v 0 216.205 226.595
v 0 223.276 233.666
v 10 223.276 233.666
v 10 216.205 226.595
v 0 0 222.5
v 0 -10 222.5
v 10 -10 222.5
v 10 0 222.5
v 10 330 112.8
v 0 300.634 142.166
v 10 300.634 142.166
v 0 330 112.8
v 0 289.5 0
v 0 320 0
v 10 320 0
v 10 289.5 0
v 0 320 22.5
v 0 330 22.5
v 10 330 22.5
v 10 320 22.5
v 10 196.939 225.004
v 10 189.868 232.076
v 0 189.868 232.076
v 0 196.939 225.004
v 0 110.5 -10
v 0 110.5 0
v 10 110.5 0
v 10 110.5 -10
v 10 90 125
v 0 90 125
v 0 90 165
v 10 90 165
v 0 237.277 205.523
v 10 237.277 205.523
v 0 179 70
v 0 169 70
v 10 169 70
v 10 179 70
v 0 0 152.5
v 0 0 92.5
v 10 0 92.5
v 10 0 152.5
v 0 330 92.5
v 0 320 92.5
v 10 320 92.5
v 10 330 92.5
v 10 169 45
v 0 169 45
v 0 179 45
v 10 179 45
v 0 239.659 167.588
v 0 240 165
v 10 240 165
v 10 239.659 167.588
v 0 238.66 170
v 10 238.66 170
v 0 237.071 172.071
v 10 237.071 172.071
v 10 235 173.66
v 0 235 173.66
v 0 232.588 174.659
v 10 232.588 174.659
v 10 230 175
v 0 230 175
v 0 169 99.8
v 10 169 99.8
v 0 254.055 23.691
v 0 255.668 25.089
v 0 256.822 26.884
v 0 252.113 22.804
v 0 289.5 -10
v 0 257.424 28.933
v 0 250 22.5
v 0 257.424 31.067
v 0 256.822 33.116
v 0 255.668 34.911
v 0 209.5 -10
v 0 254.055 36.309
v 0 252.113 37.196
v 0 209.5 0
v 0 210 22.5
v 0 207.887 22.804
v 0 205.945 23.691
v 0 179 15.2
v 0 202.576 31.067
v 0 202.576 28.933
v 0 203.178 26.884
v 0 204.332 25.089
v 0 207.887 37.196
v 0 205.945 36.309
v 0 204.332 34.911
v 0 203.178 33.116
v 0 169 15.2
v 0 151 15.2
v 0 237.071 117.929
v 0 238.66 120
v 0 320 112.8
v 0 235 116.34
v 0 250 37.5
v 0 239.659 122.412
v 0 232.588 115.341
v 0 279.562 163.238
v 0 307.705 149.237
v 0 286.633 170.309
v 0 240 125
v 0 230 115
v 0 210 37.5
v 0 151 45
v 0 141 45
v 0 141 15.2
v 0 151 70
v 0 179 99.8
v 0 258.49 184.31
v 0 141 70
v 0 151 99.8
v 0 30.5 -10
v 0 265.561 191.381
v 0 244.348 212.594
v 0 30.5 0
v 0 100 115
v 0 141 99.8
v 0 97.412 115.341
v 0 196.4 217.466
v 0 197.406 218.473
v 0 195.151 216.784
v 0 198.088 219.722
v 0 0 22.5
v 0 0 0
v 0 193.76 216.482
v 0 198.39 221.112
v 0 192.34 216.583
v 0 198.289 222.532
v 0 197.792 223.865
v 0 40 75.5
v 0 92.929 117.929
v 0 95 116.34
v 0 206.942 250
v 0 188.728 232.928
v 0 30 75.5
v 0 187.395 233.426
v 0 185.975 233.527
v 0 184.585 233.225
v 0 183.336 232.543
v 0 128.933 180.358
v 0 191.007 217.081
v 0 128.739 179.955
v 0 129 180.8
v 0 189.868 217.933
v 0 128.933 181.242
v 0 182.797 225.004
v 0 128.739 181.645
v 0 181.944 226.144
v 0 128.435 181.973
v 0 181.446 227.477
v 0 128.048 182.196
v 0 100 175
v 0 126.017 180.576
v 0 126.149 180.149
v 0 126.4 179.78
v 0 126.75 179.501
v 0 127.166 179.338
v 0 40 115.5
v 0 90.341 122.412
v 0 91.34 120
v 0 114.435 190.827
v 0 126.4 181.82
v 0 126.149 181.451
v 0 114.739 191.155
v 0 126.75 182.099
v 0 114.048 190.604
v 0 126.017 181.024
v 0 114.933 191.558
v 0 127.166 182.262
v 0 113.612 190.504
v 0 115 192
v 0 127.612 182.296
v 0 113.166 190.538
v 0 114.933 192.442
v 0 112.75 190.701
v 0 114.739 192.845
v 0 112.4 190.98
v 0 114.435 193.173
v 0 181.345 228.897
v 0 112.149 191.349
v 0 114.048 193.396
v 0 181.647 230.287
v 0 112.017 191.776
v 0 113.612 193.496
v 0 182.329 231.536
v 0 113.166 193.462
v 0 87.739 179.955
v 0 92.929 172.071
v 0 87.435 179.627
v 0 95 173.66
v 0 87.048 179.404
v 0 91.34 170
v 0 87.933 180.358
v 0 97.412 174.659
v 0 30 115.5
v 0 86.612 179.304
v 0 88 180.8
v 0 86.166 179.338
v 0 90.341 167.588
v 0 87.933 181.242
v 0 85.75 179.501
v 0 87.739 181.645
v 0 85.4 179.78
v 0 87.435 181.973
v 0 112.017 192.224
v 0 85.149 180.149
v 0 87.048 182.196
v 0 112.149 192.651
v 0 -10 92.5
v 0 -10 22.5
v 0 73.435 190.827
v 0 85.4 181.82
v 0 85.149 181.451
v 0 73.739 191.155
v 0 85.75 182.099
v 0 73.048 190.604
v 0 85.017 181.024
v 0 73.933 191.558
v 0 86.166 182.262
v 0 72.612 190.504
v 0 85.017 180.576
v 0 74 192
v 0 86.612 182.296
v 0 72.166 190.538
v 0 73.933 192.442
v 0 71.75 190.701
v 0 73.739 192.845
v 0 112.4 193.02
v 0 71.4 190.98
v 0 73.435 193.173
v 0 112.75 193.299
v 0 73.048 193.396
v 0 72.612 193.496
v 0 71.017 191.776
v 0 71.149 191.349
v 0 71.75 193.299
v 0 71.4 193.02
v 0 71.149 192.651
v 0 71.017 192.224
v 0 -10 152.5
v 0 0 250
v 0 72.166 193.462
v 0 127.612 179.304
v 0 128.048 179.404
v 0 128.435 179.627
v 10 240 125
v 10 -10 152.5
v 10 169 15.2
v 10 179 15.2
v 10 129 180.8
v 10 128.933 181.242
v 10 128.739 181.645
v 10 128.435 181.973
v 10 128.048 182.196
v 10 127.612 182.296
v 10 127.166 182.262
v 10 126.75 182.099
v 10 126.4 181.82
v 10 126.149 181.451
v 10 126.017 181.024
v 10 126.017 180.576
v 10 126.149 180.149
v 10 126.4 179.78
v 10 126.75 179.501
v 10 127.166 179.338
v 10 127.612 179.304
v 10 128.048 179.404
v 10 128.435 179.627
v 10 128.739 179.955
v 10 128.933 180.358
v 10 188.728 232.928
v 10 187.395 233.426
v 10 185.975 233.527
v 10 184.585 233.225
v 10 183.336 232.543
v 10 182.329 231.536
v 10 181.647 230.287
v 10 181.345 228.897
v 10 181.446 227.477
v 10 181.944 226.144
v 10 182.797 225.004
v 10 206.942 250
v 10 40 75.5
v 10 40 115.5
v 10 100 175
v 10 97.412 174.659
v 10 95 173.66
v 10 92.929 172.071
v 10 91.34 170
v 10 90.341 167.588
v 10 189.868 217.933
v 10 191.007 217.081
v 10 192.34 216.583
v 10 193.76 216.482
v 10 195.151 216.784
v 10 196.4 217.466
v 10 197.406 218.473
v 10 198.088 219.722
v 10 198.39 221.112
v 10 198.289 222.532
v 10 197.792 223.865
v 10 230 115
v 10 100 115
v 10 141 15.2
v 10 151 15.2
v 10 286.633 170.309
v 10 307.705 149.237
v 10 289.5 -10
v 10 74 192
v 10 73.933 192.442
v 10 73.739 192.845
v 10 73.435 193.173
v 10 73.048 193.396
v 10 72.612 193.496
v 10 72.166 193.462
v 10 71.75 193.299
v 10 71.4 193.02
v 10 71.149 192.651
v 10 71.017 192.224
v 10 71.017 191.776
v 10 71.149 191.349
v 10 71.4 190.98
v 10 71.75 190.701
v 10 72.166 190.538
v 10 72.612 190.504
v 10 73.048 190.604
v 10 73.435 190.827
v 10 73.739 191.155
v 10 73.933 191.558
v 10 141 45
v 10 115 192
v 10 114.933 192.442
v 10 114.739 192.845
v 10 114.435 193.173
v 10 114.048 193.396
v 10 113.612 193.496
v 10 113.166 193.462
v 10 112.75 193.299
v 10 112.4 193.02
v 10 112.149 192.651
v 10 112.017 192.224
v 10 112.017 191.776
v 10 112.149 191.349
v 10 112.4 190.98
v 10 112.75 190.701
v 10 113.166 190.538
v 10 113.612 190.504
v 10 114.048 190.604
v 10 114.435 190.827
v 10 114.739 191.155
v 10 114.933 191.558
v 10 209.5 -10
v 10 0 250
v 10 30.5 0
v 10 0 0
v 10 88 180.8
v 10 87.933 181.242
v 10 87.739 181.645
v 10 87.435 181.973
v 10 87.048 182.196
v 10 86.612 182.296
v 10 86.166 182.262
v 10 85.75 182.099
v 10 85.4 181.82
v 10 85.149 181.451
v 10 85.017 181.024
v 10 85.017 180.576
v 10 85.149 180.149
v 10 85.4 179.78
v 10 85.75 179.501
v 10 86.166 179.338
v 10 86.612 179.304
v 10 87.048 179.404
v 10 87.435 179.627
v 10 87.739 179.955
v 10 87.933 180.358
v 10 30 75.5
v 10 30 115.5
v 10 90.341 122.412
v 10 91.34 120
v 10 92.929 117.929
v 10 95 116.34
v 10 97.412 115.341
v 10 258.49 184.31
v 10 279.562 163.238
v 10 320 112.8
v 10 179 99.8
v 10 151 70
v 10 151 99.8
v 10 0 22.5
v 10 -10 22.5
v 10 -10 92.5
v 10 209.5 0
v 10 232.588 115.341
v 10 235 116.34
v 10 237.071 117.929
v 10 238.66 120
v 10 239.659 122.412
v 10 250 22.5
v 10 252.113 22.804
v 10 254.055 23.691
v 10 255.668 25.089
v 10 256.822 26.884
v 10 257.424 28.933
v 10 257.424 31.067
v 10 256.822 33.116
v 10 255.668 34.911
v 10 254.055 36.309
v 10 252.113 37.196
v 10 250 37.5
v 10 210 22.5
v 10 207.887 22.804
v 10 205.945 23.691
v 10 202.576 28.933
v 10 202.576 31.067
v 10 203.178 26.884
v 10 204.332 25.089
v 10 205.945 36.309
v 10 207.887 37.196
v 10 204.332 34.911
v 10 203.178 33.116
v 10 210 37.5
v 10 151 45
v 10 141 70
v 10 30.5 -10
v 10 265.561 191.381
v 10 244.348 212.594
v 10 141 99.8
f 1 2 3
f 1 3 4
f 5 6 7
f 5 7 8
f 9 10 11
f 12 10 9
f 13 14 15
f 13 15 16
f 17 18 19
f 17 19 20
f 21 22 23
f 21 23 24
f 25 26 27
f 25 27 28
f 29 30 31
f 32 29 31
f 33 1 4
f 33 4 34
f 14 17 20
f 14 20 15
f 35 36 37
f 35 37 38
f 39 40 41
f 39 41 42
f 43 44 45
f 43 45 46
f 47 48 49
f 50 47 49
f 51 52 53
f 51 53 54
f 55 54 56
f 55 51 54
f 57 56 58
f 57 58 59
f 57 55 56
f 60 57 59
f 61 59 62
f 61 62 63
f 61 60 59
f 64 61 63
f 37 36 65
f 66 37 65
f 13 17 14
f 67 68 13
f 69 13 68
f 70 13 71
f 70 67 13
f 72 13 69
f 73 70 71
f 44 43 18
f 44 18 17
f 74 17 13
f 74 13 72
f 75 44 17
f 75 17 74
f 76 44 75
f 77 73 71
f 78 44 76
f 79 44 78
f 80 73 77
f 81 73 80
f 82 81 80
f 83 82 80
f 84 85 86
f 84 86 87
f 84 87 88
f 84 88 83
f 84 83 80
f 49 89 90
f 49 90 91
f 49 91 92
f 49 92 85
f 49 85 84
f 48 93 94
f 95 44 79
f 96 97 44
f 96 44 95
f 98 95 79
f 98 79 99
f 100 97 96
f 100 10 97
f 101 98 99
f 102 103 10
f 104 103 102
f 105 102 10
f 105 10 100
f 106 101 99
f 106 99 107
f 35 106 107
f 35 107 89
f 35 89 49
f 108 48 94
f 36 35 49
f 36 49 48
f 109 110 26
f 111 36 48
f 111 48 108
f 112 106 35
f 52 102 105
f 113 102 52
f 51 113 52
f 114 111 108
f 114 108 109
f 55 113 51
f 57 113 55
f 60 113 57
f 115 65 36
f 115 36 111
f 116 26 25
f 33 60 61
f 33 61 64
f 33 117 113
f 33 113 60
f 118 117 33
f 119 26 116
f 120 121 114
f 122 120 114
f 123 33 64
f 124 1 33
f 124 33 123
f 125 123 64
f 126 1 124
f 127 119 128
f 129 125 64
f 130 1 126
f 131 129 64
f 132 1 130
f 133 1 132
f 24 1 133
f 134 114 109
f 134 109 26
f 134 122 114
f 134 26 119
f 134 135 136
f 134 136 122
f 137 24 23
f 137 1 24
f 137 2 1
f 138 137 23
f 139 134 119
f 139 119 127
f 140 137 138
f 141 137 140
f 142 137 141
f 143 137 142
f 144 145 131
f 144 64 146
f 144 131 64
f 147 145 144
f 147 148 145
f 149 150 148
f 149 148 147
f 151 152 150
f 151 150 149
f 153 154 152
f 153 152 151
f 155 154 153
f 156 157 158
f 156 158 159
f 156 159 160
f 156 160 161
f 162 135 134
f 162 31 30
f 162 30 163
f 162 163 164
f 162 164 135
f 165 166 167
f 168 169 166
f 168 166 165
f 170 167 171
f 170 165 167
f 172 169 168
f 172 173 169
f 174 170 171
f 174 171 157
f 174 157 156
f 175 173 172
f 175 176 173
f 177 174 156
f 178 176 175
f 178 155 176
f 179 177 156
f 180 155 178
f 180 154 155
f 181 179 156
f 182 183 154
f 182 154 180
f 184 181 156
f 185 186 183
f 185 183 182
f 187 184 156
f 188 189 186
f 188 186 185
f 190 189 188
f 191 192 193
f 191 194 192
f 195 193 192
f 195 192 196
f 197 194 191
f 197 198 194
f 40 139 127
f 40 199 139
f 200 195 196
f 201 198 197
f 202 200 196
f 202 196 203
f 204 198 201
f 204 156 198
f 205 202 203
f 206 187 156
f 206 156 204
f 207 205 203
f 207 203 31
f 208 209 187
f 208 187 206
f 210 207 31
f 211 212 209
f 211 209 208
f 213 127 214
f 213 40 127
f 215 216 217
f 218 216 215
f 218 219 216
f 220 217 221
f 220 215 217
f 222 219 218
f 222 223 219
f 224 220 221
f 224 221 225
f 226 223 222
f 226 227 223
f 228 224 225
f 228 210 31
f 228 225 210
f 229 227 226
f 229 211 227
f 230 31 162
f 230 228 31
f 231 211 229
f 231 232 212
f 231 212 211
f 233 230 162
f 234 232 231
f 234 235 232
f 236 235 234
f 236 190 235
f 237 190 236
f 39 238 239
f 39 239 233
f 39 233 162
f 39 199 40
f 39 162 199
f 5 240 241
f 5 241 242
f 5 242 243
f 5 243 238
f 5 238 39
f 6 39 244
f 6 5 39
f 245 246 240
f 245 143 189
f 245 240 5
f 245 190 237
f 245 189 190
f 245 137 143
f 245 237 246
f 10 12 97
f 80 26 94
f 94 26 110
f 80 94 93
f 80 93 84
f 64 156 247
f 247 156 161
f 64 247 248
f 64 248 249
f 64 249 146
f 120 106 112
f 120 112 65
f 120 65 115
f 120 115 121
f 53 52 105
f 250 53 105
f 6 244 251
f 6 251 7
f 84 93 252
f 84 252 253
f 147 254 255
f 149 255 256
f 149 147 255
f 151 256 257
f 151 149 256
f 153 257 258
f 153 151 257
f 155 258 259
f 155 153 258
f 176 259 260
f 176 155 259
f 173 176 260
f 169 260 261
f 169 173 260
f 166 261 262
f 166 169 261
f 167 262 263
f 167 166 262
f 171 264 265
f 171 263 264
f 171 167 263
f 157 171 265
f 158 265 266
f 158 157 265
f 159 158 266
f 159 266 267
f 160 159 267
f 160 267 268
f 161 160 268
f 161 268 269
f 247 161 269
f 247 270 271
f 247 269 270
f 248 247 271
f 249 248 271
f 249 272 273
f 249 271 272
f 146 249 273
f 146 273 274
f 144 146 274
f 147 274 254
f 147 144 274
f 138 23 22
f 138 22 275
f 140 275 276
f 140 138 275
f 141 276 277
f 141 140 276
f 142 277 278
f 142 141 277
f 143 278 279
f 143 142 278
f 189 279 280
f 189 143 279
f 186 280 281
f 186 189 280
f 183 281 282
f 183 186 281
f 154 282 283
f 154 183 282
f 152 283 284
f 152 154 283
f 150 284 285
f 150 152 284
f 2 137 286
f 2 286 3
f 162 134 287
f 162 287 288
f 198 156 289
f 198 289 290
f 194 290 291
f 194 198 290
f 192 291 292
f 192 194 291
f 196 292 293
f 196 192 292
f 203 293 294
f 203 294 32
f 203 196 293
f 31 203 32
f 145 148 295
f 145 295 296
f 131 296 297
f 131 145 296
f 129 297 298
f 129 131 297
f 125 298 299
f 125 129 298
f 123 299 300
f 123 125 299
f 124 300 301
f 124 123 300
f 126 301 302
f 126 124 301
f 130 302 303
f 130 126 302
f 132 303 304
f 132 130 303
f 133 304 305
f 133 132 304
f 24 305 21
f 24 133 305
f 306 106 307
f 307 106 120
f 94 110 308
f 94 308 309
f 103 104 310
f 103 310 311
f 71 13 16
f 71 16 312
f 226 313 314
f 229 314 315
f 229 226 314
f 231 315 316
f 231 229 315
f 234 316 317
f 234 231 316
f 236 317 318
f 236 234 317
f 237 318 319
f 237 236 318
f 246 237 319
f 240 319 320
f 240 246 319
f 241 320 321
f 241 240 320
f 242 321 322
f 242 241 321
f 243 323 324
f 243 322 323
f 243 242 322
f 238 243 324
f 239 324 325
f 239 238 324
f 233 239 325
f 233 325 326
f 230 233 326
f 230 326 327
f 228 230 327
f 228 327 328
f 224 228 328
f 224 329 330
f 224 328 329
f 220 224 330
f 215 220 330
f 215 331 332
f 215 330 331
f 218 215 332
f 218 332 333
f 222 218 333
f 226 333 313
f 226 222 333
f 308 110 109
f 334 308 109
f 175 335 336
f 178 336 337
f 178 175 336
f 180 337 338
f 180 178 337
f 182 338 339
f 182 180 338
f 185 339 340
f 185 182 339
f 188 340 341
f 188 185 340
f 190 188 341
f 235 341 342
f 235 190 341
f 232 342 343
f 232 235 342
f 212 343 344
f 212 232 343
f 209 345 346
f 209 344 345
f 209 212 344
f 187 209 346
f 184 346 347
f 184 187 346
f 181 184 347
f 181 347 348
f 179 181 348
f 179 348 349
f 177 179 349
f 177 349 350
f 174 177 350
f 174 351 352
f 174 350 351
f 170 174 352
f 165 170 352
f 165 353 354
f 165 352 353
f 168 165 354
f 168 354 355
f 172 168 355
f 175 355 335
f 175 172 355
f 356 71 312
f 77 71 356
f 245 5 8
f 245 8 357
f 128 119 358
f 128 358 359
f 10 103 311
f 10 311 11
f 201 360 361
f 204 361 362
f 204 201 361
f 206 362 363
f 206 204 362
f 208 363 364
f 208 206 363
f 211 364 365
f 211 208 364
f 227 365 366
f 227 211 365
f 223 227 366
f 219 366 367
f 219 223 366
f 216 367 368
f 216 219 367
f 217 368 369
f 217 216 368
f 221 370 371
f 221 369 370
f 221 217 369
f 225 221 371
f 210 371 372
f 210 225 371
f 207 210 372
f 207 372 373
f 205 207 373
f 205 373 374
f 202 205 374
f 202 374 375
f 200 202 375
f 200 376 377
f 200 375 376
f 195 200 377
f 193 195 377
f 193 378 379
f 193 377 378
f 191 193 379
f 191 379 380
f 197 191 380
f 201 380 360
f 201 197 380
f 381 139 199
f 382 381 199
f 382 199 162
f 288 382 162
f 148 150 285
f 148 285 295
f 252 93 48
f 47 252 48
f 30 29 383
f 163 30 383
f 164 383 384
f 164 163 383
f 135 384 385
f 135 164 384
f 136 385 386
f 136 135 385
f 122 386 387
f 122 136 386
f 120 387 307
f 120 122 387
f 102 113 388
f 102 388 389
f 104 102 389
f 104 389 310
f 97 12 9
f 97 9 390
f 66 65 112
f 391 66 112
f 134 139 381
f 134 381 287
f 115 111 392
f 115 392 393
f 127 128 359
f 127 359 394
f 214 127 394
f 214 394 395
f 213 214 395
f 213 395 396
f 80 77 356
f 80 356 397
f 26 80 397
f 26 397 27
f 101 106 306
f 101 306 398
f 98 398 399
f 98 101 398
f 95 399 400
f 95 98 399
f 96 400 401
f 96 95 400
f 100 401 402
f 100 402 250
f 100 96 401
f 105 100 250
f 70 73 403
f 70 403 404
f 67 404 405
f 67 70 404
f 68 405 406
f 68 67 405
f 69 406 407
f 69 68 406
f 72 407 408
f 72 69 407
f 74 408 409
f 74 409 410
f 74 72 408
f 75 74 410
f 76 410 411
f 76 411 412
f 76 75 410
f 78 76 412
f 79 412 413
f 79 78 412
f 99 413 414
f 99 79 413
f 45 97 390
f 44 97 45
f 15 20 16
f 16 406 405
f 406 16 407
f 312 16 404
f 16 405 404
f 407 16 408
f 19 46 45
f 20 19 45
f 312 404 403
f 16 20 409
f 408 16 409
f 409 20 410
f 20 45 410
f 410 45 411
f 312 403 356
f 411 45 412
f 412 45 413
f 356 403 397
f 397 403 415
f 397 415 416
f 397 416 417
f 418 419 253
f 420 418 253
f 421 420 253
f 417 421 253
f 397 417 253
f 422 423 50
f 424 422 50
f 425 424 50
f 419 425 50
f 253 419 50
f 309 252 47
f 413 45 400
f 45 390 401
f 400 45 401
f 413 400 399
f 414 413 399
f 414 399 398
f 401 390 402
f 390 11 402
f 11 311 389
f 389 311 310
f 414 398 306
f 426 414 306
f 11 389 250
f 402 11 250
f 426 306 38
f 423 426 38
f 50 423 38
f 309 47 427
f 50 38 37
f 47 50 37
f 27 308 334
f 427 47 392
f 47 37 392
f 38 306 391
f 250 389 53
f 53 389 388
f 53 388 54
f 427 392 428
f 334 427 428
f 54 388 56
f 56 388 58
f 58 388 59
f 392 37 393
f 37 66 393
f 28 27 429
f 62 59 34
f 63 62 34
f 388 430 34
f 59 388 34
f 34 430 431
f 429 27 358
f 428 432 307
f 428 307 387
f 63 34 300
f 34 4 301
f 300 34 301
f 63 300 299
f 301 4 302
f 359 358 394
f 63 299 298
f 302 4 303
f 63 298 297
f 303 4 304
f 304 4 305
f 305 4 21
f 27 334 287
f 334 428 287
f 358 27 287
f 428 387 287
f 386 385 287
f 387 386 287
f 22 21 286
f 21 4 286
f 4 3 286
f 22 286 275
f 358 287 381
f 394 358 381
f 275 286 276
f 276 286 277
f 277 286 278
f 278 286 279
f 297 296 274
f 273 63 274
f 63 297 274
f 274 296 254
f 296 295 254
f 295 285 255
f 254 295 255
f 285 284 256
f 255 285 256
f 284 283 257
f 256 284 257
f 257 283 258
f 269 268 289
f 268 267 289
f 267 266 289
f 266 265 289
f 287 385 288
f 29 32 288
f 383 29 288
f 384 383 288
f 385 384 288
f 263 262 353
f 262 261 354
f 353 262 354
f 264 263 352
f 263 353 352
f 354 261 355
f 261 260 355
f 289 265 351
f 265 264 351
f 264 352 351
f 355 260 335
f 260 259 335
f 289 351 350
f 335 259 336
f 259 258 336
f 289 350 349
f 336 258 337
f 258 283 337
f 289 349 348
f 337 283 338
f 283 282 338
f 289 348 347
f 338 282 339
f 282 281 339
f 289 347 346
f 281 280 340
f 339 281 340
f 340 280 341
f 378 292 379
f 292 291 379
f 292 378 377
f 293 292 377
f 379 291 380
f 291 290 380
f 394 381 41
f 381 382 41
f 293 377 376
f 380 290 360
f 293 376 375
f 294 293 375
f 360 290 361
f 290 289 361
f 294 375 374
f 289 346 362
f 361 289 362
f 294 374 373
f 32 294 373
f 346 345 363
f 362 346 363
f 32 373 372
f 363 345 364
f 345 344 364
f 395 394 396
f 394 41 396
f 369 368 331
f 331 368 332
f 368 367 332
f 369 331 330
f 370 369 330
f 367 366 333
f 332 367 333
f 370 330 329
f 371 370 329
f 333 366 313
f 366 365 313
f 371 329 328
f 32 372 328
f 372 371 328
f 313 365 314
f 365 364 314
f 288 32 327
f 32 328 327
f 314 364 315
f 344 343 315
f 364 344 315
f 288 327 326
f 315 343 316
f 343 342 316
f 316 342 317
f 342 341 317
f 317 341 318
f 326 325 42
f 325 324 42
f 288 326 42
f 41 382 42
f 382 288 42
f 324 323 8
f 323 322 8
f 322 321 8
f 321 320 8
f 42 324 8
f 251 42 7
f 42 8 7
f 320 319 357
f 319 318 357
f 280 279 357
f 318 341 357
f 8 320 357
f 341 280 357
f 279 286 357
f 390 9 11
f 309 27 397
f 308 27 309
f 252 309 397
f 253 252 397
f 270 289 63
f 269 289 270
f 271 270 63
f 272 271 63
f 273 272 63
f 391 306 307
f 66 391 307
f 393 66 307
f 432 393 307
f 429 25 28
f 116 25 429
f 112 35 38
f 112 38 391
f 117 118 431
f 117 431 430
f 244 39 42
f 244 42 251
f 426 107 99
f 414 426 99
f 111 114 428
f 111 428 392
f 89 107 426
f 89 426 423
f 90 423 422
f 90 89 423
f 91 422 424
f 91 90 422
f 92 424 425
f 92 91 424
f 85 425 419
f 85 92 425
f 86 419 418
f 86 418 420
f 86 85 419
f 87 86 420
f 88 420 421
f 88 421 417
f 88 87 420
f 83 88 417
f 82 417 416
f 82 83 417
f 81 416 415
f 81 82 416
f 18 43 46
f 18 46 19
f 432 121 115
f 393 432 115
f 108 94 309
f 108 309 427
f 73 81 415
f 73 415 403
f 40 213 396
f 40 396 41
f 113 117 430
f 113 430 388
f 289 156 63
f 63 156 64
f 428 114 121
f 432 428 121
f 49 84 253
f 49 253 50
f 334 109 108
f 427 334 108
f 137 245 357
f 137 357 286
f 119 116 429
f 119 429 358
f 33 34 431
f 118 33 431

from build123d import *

# Parameters (mm, degrees)
SKETCH_W     = 10
SKETCH_H     = 40
SKETCH_H_2   = 29.8
PAD_DEPTH    = 10
SKETCH001_R  = 1.5
POCKET_DEPTH = 10.001


with BuildPart() as part:
    # Sketch → Pad (new body)
    with BuildSketch(Plane.YZ):
        Polygon((0, 0), (0, 22.5), (-10, 22.5), (-10, 92.5), (0, 92.5), (0, 152.5), (-10, 152.5), (-10, 222.5), (0, 222.5), (0, 250), (206.942136, 250), (223.276302, 233.665833), (216.205235, 226.594766), (237.277017, 205.522983), (244.348084, 212.594051), (265.561288, 191.380848), (258.49022, 184.30978), (279.562002, 163.237998), (286.63307, 170.309066), (307.704852, 149.237284), (300.633784, 142.166216), (330, 112.8), (320, 112.8), (320, 92.5), (330, 92.5), (330, 22.5), (320, 22.5), (320, 0), (289.5, 0), (289.5, -10), (209.5, -10), (209.5, 0), (110.5, 0), (110.5, -10), (30.5, -10), (30.5, 0), align=None)
        with Locations((35, 95.5)):
            Rectangle(SKETCH_W, SKETCH_H, mode=Mode.SUBTRACT)
        with Locations((146, 84.9)):
            Rectangle(SKETCH_W, SKETCH_H_2, mode=Mode.SUBTRACT)
        with Locations((146, 30.1)):
            Rectangle(SKETCH_W, SKETCH_H_2, mode=Mode.SUBTRACT)
        with Locations((174, 84.9)):
            Rectangle(SKETCH_W, SKETCH_H_2, mode=Mode.SUBTRACT)
        with Locations((174, 30.1)):
            Rectangle(SKETCH_W, SKETCH_H_2, mode=Mode.SUBTRACT)
        with BuildLine():
            Line((100, 175), (230, 175))
            ThreePointArc((240, 165), (237.071068, 172.071068), (230, 175))
            Line((240, 165), (240, 125))
            ThreePointArc((230, 115), (237.071068, 117.928932), (240, 125))
            Line((230, 115), (100, 115))
            ThreePointArc((90, 125), (92.928932, 117.928932), (100, 115))
            Line((90, 125), (90, 165))
            ThreePointArc((100, 175), (92.928932, 172.071068), (90, 165))
        make_face(mode=Mode.SUBTRACT)
        with BuildLine():
            ThreePointArc((189.86767, 232.075534), (182.796602, 232.075534), (182.796602, 225.004466))
            Line((182.796602, 225.004466), (189.86767, 217.933398))
            ThreePointArc((189.86767, 217.933398), (196.938737, 217.933398), (196.938737, 225.004466))
            Line((189.86767, 232.075534), (196.938737, 225.004466))
        make_face(mode=Mode.SUBTRACT)
        with BuildLine():
            ThreePointArc((210, 37.5), (202.5, 30), (210, 22.5))
            Line((210, 22.5), (250, 22.5))
            ThreePointArc((250, 22.5), (257.5, 30), (250, 37.5))
            Line((210, 37.5), (250, 37.5))
        make_face(mode=Mode.SUBTRACT)
    extrude(amount=PAD_DEPTH)

    # Sketch001 → Pocket (cut, through all)
    with BuildSketch(Plane.YZ):
        with Locations((72.5, 192)):
            Circle(SKETCH001_R)
        with Locations((86.5, 180.8)):
            Circle(SKETCH001_R)
        with Locations((113.5, 192)):
            Circle(SKETCH001_R)
        with Locations((127.5, 180.8)):
            Circle(SKETCH001_R)
    extrude(amount=POCKET_DEPTH, mode=Mode.SUBTRACT)


solid = part.part
